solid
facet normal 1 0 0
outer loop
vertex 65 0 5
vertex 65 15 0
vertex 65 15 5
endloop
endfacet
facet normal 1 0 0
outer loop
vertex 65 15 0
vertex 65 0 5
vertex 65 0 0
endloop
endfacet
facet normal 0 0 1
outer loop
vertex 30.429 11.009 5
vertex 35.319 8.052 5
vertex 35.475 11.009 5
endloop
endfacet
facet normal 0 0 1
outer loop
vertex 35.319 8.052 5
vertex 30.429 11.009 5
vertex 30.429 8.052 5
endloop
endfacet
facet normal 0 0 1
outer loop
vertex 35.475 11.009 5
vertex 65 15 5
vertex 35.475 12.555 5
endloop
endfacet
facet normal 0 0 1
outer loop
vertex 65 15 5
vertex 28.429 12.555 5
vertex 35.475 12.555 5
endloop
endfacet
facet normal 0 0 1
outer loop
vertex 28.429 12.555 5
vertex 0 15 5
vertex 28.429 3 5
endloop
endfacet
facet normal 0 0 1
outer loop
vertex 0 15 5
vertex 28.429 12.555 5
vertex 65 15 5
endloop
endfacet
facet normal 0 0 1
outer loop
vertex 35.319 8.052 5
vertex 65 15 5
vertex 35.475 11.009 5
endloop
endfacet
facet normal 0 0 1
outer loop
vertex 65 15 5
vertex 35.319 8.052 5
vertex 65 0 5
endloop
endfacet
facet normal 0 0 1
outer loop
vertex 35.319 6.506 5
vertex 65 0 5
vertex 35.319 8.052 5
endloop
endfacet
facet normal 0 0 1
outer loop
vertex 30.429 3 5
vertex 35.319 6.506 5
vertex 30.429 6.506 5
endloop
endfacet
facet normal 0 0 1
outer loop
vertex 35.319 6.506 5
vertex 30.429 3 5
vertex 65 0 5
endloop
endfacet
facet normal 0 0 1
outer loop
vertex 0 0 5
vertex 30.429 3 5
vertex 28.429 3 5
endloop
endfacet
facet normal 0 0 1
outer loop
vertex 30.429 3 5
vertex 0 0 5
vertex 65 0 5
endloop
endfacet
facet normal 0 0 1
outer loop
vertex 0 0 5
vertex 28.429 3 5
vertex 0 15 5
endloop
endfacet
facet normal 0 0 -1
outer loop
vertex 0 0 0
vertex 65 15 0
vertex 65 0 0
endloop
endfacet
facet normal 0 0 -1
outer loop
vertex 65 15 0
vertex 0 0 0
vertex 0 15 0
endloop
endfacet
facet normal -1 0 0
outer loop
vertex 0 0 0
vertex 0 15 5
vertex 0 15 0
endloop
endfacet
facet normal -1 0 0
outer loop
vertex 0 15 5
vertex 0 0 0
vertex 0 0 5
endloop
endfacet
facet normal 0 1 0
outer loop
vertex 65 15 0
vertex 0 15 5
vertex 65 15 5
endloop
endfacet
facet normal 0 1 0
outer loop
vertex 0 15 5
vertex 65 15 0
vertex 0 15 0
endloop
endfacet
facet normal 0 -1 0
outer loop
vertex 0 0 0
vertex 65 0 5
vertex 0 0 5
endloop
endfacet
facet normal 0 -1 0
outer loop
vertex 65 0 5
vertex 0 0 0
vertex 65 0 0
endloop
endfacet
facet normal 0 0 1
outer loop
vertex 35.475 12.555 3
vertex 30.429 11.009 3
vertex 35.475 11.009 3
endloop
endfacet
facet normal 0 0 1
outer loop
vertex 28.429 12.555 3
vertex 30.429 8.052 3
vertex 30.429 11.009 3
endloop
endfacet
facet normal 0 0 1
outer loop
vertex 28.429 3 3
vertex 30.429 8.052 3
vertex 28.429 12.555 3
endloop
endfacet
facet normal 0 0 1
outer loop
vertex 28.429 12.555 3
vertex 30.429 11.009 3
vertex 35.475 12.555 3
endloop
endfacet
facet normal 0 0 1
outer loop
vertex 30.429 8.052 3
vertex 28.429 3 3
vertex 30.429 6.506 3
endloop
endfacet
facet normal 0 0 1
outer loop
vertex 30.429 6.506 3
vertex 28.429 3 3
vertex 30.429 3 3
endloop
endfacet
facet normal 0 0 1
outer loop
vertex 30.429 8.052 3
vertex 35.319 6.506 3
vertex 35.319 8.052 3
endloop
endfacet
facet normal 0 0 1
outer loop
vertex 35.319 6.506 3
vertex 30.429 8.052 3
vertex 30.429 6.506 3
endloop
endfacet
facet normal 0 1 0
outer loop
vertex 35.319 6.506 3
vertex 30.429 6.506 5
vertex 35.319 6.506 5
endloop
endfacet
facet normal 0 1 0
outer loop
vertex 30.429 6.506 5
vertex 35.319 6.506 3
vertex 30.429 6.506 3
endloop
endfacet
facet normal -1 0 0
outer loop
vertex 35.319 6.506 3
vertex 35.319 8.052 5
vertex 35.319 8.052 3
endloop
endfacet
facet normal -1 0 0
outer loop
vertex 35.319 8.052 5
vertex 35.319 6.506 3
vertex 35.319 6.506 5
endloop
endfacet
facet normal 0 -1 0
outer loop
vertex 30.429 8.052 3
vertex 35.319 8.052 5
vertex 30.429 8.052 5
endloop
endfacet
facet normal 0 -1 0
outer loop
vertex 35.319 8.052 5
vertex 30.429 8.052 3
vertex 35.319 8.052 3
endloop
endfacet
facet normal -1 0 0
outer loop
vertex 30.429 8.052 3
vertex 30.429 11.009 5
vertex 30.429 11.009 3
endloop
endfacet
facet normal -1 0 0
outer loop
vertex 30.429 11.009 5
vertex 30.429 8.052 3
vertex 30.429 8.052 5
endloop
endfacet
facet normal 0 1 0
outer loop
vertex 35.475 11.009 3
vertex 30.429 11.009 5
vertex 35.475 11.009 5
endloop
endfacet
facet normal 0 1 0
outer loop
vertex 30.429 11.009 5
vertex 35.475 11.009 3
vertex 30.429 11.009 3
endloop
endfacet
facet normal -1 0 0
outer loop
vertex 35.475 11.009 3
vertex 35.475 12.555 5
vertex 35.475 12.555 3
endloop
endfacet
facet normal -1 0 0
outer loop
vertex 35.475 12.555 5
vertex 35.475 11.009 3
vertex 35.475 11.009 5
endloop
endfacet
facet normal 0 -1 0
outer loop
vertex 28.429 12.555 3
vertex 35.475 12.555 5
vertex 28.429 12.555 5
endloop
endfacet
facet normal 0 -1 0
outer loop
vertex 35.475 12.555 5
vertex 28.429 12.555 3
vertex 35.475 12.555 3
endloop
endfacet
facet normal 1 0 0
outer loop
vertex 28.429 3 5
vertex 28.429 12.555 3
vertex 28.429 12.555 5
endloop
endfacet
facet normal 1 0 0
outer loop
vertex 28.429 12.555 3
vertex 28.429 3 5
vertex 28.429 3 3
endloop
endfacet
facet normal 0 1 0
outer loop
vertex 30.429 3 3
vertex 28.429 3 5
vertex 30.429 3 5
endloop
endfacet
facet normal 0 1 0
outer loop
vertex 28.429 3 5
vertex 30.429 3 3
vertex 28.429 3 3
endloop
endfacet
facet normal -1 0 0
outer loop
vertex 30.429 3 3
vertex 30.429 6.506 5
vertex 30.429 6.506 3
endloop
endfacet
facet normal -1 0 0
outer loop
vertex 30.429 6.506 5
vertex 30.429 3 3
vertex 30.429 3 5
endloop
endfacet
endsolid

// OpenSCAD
difference(){
	union(){ 
        translate([0,0,0]){
           cube([65,15,5], center=false);
        }                
	}
	union() {
        translate([60-65/2, 3,3]){
            linear_extrude(height = 10) {
                text("F", size = 10, font="Arial:style=Bold");
            }
        }                


	}
}
